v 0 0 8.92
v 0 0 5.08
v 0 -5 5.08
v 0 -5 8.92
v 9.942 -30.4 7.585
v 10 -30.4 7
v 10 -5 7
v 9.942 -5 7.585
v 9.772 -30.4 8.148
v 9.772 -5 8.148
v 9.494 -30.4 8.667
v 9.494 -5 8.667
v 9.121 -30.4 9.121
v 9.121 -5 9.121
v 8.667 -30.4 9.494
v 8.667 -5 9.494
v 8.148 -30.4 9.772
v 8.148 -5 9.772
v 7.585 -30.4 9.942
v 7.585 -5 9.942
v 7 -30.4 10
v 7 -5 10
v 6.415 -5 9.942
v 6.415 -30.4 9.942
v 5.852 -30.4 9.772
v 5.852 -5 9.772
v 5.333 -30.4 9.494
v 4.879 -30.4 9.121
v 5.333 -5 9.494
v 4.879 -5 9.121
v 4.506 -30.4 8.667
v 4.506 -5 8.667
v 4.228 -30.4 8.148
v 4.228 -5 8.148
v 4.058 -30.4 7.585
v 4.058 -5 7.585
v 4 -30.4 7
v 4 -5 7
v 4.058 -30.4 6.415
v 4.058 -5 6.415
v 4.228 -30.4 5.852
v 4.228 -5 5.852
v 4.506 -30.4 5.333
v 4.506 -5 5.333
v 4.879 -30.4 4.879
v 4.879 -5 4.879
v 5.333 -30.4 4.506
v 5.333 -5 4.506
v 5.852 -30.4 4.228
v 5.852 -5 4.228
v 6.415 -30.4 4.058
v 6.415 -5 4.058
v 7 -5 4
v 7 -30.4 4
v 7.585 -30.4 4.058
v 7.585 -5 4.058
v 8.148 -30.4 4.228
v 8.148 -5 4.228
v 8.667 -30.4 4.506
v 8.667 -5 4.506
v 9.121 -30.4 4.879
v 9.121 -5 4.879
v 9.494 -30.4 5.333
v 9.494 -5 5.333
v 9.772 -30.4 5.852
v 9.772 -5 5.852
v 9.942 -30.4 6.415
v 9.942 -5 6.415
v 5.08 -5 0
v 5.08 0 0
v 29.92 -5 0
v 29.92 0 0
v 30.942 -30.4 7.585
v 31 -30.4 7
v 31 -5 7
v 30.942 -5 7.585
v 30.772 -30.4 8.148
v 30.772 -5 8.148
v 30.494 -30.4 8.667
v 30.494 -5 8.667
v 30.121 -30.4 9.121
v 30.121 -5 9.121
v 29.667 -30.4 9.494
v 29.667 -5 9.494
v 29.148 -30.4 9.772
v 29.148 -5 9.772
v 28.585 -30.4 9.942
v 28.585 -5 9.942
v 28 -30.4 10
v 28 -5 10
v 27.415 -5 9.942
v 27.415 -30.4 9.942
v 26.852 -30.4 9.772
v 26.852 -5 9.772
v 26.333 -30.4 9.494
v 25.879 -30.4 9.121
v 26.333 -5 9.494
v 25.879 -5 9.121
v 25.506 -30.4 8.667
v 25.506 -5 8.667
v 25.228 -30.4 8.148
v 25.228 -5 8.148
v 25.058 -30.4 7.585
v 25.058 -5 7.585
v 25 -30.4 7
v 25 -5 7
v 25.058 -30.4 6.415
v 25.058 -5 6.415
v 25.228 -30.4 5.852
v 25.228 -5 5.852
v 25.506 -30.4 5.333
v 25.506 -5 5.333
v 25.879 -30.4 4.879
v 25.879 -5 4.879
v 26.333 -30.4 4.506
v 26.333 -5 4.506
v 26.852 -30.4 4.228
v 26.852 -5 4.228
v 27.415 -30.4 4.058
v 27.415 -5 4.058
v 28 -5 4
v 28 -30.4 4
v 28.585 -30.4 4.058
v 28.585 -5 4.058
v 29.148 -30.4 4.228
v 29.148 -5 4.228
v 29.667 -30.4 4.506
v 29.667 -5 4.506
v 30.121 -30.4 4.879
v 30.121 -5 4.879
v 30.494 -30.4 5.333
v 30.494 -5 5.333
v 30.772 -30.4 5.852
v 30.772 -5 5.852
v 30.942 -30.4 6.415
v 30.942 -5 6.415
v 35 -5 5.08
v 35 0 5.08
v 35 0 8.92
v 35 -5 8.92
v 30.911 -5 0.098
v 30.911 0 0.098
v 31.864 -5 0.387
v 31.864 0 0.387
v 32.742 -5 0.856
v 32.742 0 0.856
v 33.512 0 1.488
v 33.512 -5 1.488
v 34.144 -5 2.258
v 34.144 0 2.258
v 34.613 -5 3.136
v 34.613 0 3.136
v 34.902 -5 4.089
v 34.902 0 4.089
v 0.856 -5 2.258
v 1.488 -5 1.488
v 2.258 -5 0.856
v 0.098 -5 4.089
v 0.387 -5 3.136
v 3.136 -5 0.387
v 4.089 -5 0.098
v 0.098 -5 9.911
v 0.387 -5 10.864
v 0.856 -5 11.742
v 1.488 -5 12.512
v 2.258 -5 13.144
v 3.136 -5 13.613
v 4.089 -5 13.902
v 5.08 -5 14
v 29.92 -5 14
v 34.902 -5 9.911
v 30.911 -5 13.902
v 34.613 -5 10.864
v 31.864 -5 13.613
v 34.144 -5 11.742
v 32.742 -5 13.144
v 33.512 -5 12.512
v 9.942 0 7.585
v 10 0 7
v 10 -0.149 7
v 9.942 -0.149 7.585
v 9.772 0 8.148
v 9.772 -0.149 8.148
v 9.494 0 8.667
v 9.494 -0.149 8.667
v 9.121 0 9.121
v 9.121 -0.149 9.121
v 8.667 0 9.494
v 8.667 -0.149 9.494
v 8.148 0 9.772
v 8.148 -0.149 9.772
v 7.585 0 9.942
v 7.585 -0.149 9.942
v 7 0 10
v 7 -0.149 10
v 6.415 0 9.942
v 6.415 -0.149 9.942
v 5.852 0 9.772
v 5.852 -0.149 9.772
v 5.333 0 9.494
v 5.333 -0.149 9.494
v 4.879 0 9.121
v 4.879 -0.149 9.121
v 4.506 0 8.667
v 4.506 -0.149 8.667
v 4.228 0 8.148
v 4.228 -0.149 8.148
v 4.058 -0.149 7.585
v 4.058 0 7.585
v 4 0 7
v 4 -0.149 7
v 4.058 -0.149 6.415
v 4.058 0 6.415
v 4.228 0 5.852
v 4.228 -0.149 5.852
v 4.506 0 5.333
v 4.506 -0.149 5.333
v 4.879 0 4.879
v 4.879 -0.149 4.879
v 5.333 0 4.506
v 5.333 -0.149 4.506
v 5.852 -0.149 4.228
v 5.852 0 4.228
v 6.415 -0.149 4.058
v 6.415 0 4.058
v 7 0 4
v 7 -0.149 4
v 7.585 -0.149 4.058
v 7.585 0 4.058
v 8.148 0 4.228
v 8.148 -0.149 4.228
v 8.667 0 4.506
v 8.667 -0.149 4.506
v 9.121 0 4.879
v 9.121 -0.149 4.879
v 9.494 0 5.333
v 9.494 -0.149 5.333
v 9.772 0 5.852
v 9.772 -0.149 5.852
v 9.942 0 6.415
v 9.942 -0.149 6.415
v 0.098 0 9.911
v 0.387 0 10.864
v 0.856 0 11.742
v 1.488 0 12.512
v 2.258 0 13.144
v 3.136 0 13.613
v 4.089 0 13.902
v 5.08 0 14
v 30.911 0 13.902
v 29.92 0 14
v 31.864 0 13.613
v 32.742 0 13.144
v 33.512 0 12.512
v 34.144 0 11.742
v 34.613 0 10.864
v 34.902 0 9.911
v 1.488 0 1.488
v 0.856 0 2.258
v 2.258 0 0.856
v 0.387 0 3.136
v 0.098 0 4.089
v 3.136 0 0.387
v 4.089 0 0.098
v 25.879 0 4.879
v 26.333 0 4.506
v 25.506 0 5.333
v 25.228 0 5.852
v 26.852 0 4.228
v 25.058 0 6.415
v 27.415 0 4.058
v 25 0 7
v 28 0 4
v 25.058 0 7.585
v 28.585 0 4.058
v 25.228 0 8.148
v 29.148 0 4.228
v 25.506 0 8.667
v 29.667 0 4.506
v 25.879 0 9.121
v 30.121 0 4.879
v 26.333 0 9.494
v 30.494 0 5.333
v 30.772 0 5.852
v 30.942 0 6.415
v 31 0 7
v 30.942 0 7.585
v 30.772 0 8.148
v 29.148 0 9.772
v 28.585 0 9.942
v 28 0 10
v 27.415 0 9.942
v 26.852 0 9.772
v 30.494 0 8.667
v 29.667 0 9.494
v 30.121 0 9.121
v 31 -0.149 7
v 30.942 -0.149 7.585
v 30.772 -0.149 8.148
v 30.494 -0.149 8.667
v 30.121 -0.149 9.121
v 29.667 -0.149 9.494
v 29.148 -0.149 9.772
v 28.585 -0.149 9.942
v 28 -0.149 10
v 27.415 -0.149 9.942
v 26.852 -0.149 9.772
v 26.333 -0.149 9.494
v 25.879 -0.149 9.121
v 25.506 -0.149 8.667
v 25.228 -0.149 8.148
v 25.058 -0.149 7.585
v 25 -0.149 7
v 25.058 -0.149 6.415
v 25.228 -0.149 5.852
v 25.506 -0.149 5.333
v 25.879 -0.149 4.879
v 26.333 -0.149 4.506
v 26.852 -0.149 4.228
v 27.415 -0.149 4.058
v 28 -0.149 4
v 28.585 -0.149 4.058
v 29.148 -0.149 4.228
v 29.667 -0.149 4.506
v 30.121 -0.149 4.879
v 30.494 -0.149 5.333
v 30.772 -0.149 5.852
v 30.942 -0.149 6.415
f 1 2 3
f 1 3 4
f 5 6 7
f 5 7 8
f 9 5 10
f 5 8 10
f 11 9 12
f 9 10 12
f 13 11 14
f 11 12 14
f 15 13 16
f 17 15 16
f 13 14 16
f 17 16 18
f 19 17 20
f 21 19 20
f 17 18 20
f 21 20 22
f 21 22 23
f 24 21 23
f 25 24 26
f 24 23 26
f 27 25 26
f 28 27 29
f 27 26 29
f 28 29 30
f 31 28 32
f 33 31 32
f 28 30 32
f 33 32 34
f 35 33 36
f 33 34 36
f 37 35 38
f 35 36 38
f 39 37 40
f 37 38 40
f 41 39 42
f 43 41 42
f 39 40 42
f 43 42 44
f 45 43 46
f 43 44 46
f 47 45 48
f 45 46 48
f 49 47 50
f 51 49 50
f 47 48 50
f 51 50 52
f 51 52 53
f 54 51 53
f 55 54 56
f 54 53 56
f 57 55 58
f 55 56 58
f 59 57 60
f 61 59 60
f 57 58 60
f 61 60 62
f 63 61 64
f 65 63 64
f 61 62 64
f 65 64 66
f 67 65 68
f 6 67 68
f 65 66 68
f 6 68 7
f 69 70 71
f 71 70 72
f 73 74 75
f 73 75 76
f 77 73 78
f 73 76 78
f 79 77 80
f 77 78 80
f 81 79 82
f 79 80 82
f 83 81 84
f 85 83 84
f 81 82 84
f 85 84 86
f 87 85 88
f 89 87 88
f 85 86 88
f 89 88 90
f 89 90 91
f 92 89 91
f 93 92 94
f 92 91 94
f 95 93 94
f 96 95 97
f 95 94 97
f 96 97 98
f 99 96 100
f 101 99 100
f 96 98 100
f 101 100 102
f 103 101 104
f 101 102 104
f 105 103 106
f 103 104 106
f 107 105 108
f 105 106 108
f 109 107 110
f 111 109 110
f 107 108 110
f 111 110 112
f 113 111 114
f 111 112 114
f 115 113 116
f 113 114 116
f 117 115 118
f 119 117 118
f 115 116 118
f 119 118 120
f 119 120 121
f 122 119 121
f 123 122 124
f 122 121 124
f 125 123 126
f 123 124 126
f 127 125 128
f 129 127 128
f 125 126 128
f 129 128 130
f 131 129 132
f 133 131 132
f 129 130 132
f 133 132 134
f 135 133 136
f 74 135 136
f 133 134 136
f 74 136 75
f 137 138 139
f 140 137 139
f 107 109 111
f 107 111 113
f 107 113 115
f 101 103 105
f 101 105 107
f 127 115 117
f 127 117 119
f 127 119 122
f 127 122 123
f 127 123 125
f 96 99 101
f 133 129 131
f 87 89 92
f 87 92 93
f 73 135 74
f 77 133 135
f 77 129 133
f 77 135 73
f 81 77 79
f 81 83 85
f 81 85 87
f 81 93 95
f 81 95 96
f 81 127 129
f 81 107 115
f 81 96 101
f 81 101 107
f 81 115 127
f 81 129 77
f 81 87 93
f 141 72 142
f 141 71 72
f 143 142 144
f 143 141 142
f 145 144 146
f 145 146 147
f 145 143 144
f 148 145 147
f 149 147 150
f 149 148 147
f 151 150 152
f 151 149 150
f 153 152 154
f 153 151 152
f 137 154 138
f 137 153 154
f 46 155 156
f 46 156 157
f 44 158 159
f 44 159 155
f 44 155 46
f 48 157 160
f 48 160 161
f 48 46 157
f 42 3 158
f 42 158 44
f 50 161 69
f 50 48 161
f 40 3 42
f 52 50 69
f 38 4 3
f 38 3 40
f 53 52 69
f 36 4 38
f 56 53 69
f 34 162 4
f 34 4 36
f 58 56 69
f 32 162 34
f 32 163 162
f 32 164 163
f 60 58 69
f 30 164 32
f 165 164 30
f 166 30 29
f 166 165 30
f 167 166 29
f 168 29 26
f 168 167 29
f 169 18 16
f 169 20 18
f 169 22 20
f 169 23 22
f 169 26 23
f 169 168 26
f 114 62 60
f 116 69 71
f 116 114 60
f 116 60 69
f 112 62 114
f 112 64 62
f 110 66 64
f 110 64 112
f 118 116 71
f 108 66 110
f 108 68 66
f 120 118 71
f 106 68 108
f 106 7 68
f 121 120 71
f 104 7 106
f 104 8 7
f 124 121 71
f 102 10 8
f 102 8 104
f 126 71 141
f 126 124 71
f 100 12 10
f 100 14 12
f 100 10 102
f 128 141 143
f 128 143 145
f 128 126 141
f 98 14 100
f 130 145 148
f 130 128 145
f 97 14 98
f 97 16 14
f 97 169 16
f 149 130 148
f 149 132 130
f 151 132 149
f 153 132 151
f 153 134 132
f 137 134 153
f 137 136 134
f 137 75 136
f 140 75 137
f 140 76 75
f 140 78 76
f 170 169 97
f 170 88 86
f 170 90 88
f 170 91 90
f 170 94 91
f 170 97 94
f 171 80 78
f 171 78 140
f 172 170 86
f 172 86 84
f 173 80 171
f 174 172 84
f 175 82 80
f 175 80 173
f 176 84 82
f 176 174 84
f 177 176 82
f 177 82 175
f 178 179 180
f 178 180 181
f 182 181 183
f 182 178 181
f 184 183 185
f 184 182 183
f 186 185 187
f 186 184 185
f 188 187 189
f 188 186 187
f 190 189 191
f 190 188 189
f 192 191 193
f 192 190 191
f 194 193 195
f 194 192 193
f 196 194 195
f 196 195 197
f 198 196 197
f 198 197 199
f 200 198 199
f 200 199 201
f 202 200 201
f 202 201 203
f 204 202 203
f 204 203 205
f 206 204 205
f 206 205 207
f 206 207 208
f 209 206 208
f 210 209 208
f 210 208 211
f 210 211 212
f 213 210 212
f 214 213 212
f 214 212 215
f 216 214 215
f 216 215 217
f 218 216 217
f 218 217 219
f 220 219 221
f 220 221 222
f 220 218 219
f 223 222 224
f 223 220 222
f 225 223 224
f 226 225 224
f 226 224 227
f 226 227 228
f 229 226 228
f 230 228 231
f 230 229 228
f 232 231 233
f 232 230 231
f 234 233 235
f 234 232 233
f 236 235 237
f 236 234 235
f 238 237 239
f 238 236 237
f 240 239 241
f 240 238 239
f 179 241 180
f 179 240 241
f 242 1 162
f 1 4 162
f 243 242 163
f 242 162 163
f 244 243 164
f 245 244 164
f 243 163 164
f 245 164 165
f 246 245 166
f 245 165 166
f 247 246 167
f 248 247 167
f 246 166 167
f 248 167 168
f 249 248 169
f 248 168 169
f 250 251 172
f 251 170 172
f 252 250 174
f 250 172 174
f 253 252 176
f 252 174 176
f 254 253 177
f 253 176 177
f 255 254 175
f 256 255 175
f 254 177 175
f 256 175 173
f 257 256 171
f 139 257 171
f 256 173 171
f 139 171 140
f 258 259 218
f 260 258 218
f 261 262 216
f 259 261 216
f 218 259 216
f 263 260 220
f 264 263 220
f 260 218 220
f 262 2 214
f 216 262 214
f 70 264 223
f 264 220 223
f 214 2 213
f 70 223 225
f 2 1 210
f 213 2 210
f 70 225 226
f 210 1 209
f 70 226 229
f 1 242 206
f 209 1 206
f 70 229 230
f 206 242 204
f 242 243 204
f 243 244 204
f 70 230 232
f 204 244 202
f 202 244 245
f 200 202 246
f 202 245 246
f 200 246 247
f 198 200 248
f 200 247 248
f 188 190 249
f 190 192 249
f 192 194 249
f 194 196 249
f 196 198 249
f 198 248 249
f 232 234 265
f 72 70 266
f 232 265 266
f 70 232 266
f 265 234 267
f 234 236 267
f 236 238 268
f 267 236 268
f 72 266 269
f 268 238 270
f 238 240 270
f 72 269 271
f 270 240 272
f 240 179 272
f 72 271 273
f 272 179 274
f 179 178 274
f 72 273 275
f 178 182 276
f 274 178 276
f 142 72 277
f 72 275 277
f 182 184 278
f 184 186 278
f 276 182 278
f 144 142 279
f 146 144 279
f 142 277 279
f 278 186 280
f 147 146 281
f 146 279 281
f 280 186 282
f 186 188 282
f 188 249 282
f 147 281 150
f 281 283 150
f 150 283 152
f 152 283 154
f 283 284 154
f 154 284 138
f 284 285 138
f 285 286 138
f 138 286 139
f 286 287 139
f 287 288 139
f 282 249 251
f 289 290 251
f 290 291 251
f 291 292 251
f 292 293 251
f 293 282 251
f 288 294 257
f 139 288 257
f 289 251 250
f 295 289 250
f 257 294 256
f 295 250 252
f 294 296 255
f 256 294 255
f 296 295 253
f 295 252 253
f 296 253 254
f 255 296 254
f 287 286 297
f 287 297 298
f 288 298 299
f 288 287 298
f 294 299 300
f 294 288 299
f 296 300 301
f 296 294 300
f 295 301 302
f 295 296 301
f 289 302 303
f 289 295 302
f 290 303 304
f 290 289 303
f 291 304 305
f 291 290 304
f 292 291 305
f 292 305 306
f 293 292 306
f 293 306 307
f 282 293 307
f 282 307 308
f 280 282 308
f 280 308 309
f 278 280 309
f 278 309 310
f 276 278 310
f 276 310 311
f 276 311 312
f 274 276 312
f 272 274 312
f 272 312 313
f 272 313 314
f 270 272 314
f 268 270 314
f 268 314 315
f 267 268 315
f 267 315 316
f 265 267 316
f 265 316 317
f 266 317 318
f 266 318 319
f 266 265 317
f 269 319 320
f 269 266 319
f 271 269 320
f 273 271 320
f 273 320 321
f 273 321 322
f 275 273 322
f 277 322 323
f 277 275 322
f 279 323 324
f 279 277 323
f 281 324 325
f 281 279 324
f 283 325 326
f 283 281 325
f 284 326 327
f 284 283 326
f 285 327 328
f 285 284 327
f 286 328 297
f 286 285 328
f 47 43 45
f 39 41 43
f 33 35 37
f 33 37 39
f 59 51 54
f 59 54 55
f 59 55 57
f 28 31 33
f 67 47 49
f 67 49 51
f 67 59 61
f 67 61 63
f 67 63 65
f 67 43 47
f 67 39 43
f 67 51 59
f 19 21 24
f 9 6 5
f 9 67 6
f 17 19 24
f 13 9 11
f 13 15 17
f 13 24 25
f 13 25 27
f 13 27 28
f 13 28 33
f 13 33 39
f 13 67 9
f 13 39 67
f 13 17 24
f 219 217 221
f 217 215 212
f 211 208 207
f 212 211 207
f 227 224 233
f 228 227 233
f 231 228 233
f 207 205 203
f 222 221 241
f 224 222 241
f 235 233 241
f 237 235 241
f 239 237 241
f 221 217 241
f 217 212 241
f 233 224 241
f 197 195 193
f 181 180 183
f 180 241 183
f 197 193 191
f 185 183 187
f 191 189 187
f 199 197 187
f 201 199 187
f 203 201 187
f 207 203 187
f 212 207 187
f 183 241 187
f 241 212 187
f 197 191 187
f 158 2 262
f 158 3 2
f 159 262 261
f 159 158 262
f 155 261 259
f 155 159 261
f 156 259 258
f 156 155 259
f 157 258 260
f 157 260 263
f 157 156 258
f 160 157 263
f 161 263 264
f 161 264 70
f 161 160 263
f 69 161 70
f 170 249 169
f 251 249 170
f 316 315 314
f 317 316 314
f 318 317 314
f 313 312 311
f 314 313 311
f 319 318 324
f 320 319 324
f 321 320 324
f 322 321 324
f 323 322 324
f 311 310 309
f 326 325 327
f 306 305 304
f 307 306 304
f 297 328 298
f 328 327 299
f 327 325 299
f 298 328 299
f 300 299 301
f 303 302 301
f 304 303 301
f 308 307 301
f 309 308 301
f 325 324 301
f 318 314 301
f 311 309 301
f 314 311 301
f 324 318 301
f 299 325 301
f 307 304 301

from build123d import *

# Parameters (mm, degrees)
F0_W          = 35
F0_H          = 14
F0_R          = 3
F1_DEPTH      = 5
F2_R          = 5.08
F3_R          = 3
F4_DEPTH      = 25.4
F4_DEPTH_BACK = 4.8514


with BuildPart() as f1:
    # F0 (on Front) → F1 (new body)
    with BuildSketch(Plane.XZ):
        with Locations((17.5, 7)):
            Rectangle(F0_W, F0_H)
        with Locations((7, 7)):
            Circle(F0_R, mode=Mode.SUBTRACT)
        with Locations((28, 7)):
            Circle(F0_R, mode=Mode.SUBTRACT)
    extrude(amount=F1_DEPTH)

    # F2
    f2_edges = [f1.edges().sort_by_distance(p)[0] for p in [
        (35, -2.5, 14),
        (35, -2.5, 0),
        (0, -2.5, 0),
        (0, -2.5, 14),
    ]]
    fillet(f2_edges, radius=F2_R)

    # F3 (on face) → F4 (join, two sides)
    with BuildSketch(Plane.XZ.offset(5)) as f4_sk:
        with Locations((28, 7)):
            Circle(F3_R)
        with Locations((7, 7)):
            Circle(F3_R)
    extrude(amount=F4_DEPTH)
    extrude(f4_sk.sketch, amount=-F4_DEPTH_BACK)


solid = f1.part
